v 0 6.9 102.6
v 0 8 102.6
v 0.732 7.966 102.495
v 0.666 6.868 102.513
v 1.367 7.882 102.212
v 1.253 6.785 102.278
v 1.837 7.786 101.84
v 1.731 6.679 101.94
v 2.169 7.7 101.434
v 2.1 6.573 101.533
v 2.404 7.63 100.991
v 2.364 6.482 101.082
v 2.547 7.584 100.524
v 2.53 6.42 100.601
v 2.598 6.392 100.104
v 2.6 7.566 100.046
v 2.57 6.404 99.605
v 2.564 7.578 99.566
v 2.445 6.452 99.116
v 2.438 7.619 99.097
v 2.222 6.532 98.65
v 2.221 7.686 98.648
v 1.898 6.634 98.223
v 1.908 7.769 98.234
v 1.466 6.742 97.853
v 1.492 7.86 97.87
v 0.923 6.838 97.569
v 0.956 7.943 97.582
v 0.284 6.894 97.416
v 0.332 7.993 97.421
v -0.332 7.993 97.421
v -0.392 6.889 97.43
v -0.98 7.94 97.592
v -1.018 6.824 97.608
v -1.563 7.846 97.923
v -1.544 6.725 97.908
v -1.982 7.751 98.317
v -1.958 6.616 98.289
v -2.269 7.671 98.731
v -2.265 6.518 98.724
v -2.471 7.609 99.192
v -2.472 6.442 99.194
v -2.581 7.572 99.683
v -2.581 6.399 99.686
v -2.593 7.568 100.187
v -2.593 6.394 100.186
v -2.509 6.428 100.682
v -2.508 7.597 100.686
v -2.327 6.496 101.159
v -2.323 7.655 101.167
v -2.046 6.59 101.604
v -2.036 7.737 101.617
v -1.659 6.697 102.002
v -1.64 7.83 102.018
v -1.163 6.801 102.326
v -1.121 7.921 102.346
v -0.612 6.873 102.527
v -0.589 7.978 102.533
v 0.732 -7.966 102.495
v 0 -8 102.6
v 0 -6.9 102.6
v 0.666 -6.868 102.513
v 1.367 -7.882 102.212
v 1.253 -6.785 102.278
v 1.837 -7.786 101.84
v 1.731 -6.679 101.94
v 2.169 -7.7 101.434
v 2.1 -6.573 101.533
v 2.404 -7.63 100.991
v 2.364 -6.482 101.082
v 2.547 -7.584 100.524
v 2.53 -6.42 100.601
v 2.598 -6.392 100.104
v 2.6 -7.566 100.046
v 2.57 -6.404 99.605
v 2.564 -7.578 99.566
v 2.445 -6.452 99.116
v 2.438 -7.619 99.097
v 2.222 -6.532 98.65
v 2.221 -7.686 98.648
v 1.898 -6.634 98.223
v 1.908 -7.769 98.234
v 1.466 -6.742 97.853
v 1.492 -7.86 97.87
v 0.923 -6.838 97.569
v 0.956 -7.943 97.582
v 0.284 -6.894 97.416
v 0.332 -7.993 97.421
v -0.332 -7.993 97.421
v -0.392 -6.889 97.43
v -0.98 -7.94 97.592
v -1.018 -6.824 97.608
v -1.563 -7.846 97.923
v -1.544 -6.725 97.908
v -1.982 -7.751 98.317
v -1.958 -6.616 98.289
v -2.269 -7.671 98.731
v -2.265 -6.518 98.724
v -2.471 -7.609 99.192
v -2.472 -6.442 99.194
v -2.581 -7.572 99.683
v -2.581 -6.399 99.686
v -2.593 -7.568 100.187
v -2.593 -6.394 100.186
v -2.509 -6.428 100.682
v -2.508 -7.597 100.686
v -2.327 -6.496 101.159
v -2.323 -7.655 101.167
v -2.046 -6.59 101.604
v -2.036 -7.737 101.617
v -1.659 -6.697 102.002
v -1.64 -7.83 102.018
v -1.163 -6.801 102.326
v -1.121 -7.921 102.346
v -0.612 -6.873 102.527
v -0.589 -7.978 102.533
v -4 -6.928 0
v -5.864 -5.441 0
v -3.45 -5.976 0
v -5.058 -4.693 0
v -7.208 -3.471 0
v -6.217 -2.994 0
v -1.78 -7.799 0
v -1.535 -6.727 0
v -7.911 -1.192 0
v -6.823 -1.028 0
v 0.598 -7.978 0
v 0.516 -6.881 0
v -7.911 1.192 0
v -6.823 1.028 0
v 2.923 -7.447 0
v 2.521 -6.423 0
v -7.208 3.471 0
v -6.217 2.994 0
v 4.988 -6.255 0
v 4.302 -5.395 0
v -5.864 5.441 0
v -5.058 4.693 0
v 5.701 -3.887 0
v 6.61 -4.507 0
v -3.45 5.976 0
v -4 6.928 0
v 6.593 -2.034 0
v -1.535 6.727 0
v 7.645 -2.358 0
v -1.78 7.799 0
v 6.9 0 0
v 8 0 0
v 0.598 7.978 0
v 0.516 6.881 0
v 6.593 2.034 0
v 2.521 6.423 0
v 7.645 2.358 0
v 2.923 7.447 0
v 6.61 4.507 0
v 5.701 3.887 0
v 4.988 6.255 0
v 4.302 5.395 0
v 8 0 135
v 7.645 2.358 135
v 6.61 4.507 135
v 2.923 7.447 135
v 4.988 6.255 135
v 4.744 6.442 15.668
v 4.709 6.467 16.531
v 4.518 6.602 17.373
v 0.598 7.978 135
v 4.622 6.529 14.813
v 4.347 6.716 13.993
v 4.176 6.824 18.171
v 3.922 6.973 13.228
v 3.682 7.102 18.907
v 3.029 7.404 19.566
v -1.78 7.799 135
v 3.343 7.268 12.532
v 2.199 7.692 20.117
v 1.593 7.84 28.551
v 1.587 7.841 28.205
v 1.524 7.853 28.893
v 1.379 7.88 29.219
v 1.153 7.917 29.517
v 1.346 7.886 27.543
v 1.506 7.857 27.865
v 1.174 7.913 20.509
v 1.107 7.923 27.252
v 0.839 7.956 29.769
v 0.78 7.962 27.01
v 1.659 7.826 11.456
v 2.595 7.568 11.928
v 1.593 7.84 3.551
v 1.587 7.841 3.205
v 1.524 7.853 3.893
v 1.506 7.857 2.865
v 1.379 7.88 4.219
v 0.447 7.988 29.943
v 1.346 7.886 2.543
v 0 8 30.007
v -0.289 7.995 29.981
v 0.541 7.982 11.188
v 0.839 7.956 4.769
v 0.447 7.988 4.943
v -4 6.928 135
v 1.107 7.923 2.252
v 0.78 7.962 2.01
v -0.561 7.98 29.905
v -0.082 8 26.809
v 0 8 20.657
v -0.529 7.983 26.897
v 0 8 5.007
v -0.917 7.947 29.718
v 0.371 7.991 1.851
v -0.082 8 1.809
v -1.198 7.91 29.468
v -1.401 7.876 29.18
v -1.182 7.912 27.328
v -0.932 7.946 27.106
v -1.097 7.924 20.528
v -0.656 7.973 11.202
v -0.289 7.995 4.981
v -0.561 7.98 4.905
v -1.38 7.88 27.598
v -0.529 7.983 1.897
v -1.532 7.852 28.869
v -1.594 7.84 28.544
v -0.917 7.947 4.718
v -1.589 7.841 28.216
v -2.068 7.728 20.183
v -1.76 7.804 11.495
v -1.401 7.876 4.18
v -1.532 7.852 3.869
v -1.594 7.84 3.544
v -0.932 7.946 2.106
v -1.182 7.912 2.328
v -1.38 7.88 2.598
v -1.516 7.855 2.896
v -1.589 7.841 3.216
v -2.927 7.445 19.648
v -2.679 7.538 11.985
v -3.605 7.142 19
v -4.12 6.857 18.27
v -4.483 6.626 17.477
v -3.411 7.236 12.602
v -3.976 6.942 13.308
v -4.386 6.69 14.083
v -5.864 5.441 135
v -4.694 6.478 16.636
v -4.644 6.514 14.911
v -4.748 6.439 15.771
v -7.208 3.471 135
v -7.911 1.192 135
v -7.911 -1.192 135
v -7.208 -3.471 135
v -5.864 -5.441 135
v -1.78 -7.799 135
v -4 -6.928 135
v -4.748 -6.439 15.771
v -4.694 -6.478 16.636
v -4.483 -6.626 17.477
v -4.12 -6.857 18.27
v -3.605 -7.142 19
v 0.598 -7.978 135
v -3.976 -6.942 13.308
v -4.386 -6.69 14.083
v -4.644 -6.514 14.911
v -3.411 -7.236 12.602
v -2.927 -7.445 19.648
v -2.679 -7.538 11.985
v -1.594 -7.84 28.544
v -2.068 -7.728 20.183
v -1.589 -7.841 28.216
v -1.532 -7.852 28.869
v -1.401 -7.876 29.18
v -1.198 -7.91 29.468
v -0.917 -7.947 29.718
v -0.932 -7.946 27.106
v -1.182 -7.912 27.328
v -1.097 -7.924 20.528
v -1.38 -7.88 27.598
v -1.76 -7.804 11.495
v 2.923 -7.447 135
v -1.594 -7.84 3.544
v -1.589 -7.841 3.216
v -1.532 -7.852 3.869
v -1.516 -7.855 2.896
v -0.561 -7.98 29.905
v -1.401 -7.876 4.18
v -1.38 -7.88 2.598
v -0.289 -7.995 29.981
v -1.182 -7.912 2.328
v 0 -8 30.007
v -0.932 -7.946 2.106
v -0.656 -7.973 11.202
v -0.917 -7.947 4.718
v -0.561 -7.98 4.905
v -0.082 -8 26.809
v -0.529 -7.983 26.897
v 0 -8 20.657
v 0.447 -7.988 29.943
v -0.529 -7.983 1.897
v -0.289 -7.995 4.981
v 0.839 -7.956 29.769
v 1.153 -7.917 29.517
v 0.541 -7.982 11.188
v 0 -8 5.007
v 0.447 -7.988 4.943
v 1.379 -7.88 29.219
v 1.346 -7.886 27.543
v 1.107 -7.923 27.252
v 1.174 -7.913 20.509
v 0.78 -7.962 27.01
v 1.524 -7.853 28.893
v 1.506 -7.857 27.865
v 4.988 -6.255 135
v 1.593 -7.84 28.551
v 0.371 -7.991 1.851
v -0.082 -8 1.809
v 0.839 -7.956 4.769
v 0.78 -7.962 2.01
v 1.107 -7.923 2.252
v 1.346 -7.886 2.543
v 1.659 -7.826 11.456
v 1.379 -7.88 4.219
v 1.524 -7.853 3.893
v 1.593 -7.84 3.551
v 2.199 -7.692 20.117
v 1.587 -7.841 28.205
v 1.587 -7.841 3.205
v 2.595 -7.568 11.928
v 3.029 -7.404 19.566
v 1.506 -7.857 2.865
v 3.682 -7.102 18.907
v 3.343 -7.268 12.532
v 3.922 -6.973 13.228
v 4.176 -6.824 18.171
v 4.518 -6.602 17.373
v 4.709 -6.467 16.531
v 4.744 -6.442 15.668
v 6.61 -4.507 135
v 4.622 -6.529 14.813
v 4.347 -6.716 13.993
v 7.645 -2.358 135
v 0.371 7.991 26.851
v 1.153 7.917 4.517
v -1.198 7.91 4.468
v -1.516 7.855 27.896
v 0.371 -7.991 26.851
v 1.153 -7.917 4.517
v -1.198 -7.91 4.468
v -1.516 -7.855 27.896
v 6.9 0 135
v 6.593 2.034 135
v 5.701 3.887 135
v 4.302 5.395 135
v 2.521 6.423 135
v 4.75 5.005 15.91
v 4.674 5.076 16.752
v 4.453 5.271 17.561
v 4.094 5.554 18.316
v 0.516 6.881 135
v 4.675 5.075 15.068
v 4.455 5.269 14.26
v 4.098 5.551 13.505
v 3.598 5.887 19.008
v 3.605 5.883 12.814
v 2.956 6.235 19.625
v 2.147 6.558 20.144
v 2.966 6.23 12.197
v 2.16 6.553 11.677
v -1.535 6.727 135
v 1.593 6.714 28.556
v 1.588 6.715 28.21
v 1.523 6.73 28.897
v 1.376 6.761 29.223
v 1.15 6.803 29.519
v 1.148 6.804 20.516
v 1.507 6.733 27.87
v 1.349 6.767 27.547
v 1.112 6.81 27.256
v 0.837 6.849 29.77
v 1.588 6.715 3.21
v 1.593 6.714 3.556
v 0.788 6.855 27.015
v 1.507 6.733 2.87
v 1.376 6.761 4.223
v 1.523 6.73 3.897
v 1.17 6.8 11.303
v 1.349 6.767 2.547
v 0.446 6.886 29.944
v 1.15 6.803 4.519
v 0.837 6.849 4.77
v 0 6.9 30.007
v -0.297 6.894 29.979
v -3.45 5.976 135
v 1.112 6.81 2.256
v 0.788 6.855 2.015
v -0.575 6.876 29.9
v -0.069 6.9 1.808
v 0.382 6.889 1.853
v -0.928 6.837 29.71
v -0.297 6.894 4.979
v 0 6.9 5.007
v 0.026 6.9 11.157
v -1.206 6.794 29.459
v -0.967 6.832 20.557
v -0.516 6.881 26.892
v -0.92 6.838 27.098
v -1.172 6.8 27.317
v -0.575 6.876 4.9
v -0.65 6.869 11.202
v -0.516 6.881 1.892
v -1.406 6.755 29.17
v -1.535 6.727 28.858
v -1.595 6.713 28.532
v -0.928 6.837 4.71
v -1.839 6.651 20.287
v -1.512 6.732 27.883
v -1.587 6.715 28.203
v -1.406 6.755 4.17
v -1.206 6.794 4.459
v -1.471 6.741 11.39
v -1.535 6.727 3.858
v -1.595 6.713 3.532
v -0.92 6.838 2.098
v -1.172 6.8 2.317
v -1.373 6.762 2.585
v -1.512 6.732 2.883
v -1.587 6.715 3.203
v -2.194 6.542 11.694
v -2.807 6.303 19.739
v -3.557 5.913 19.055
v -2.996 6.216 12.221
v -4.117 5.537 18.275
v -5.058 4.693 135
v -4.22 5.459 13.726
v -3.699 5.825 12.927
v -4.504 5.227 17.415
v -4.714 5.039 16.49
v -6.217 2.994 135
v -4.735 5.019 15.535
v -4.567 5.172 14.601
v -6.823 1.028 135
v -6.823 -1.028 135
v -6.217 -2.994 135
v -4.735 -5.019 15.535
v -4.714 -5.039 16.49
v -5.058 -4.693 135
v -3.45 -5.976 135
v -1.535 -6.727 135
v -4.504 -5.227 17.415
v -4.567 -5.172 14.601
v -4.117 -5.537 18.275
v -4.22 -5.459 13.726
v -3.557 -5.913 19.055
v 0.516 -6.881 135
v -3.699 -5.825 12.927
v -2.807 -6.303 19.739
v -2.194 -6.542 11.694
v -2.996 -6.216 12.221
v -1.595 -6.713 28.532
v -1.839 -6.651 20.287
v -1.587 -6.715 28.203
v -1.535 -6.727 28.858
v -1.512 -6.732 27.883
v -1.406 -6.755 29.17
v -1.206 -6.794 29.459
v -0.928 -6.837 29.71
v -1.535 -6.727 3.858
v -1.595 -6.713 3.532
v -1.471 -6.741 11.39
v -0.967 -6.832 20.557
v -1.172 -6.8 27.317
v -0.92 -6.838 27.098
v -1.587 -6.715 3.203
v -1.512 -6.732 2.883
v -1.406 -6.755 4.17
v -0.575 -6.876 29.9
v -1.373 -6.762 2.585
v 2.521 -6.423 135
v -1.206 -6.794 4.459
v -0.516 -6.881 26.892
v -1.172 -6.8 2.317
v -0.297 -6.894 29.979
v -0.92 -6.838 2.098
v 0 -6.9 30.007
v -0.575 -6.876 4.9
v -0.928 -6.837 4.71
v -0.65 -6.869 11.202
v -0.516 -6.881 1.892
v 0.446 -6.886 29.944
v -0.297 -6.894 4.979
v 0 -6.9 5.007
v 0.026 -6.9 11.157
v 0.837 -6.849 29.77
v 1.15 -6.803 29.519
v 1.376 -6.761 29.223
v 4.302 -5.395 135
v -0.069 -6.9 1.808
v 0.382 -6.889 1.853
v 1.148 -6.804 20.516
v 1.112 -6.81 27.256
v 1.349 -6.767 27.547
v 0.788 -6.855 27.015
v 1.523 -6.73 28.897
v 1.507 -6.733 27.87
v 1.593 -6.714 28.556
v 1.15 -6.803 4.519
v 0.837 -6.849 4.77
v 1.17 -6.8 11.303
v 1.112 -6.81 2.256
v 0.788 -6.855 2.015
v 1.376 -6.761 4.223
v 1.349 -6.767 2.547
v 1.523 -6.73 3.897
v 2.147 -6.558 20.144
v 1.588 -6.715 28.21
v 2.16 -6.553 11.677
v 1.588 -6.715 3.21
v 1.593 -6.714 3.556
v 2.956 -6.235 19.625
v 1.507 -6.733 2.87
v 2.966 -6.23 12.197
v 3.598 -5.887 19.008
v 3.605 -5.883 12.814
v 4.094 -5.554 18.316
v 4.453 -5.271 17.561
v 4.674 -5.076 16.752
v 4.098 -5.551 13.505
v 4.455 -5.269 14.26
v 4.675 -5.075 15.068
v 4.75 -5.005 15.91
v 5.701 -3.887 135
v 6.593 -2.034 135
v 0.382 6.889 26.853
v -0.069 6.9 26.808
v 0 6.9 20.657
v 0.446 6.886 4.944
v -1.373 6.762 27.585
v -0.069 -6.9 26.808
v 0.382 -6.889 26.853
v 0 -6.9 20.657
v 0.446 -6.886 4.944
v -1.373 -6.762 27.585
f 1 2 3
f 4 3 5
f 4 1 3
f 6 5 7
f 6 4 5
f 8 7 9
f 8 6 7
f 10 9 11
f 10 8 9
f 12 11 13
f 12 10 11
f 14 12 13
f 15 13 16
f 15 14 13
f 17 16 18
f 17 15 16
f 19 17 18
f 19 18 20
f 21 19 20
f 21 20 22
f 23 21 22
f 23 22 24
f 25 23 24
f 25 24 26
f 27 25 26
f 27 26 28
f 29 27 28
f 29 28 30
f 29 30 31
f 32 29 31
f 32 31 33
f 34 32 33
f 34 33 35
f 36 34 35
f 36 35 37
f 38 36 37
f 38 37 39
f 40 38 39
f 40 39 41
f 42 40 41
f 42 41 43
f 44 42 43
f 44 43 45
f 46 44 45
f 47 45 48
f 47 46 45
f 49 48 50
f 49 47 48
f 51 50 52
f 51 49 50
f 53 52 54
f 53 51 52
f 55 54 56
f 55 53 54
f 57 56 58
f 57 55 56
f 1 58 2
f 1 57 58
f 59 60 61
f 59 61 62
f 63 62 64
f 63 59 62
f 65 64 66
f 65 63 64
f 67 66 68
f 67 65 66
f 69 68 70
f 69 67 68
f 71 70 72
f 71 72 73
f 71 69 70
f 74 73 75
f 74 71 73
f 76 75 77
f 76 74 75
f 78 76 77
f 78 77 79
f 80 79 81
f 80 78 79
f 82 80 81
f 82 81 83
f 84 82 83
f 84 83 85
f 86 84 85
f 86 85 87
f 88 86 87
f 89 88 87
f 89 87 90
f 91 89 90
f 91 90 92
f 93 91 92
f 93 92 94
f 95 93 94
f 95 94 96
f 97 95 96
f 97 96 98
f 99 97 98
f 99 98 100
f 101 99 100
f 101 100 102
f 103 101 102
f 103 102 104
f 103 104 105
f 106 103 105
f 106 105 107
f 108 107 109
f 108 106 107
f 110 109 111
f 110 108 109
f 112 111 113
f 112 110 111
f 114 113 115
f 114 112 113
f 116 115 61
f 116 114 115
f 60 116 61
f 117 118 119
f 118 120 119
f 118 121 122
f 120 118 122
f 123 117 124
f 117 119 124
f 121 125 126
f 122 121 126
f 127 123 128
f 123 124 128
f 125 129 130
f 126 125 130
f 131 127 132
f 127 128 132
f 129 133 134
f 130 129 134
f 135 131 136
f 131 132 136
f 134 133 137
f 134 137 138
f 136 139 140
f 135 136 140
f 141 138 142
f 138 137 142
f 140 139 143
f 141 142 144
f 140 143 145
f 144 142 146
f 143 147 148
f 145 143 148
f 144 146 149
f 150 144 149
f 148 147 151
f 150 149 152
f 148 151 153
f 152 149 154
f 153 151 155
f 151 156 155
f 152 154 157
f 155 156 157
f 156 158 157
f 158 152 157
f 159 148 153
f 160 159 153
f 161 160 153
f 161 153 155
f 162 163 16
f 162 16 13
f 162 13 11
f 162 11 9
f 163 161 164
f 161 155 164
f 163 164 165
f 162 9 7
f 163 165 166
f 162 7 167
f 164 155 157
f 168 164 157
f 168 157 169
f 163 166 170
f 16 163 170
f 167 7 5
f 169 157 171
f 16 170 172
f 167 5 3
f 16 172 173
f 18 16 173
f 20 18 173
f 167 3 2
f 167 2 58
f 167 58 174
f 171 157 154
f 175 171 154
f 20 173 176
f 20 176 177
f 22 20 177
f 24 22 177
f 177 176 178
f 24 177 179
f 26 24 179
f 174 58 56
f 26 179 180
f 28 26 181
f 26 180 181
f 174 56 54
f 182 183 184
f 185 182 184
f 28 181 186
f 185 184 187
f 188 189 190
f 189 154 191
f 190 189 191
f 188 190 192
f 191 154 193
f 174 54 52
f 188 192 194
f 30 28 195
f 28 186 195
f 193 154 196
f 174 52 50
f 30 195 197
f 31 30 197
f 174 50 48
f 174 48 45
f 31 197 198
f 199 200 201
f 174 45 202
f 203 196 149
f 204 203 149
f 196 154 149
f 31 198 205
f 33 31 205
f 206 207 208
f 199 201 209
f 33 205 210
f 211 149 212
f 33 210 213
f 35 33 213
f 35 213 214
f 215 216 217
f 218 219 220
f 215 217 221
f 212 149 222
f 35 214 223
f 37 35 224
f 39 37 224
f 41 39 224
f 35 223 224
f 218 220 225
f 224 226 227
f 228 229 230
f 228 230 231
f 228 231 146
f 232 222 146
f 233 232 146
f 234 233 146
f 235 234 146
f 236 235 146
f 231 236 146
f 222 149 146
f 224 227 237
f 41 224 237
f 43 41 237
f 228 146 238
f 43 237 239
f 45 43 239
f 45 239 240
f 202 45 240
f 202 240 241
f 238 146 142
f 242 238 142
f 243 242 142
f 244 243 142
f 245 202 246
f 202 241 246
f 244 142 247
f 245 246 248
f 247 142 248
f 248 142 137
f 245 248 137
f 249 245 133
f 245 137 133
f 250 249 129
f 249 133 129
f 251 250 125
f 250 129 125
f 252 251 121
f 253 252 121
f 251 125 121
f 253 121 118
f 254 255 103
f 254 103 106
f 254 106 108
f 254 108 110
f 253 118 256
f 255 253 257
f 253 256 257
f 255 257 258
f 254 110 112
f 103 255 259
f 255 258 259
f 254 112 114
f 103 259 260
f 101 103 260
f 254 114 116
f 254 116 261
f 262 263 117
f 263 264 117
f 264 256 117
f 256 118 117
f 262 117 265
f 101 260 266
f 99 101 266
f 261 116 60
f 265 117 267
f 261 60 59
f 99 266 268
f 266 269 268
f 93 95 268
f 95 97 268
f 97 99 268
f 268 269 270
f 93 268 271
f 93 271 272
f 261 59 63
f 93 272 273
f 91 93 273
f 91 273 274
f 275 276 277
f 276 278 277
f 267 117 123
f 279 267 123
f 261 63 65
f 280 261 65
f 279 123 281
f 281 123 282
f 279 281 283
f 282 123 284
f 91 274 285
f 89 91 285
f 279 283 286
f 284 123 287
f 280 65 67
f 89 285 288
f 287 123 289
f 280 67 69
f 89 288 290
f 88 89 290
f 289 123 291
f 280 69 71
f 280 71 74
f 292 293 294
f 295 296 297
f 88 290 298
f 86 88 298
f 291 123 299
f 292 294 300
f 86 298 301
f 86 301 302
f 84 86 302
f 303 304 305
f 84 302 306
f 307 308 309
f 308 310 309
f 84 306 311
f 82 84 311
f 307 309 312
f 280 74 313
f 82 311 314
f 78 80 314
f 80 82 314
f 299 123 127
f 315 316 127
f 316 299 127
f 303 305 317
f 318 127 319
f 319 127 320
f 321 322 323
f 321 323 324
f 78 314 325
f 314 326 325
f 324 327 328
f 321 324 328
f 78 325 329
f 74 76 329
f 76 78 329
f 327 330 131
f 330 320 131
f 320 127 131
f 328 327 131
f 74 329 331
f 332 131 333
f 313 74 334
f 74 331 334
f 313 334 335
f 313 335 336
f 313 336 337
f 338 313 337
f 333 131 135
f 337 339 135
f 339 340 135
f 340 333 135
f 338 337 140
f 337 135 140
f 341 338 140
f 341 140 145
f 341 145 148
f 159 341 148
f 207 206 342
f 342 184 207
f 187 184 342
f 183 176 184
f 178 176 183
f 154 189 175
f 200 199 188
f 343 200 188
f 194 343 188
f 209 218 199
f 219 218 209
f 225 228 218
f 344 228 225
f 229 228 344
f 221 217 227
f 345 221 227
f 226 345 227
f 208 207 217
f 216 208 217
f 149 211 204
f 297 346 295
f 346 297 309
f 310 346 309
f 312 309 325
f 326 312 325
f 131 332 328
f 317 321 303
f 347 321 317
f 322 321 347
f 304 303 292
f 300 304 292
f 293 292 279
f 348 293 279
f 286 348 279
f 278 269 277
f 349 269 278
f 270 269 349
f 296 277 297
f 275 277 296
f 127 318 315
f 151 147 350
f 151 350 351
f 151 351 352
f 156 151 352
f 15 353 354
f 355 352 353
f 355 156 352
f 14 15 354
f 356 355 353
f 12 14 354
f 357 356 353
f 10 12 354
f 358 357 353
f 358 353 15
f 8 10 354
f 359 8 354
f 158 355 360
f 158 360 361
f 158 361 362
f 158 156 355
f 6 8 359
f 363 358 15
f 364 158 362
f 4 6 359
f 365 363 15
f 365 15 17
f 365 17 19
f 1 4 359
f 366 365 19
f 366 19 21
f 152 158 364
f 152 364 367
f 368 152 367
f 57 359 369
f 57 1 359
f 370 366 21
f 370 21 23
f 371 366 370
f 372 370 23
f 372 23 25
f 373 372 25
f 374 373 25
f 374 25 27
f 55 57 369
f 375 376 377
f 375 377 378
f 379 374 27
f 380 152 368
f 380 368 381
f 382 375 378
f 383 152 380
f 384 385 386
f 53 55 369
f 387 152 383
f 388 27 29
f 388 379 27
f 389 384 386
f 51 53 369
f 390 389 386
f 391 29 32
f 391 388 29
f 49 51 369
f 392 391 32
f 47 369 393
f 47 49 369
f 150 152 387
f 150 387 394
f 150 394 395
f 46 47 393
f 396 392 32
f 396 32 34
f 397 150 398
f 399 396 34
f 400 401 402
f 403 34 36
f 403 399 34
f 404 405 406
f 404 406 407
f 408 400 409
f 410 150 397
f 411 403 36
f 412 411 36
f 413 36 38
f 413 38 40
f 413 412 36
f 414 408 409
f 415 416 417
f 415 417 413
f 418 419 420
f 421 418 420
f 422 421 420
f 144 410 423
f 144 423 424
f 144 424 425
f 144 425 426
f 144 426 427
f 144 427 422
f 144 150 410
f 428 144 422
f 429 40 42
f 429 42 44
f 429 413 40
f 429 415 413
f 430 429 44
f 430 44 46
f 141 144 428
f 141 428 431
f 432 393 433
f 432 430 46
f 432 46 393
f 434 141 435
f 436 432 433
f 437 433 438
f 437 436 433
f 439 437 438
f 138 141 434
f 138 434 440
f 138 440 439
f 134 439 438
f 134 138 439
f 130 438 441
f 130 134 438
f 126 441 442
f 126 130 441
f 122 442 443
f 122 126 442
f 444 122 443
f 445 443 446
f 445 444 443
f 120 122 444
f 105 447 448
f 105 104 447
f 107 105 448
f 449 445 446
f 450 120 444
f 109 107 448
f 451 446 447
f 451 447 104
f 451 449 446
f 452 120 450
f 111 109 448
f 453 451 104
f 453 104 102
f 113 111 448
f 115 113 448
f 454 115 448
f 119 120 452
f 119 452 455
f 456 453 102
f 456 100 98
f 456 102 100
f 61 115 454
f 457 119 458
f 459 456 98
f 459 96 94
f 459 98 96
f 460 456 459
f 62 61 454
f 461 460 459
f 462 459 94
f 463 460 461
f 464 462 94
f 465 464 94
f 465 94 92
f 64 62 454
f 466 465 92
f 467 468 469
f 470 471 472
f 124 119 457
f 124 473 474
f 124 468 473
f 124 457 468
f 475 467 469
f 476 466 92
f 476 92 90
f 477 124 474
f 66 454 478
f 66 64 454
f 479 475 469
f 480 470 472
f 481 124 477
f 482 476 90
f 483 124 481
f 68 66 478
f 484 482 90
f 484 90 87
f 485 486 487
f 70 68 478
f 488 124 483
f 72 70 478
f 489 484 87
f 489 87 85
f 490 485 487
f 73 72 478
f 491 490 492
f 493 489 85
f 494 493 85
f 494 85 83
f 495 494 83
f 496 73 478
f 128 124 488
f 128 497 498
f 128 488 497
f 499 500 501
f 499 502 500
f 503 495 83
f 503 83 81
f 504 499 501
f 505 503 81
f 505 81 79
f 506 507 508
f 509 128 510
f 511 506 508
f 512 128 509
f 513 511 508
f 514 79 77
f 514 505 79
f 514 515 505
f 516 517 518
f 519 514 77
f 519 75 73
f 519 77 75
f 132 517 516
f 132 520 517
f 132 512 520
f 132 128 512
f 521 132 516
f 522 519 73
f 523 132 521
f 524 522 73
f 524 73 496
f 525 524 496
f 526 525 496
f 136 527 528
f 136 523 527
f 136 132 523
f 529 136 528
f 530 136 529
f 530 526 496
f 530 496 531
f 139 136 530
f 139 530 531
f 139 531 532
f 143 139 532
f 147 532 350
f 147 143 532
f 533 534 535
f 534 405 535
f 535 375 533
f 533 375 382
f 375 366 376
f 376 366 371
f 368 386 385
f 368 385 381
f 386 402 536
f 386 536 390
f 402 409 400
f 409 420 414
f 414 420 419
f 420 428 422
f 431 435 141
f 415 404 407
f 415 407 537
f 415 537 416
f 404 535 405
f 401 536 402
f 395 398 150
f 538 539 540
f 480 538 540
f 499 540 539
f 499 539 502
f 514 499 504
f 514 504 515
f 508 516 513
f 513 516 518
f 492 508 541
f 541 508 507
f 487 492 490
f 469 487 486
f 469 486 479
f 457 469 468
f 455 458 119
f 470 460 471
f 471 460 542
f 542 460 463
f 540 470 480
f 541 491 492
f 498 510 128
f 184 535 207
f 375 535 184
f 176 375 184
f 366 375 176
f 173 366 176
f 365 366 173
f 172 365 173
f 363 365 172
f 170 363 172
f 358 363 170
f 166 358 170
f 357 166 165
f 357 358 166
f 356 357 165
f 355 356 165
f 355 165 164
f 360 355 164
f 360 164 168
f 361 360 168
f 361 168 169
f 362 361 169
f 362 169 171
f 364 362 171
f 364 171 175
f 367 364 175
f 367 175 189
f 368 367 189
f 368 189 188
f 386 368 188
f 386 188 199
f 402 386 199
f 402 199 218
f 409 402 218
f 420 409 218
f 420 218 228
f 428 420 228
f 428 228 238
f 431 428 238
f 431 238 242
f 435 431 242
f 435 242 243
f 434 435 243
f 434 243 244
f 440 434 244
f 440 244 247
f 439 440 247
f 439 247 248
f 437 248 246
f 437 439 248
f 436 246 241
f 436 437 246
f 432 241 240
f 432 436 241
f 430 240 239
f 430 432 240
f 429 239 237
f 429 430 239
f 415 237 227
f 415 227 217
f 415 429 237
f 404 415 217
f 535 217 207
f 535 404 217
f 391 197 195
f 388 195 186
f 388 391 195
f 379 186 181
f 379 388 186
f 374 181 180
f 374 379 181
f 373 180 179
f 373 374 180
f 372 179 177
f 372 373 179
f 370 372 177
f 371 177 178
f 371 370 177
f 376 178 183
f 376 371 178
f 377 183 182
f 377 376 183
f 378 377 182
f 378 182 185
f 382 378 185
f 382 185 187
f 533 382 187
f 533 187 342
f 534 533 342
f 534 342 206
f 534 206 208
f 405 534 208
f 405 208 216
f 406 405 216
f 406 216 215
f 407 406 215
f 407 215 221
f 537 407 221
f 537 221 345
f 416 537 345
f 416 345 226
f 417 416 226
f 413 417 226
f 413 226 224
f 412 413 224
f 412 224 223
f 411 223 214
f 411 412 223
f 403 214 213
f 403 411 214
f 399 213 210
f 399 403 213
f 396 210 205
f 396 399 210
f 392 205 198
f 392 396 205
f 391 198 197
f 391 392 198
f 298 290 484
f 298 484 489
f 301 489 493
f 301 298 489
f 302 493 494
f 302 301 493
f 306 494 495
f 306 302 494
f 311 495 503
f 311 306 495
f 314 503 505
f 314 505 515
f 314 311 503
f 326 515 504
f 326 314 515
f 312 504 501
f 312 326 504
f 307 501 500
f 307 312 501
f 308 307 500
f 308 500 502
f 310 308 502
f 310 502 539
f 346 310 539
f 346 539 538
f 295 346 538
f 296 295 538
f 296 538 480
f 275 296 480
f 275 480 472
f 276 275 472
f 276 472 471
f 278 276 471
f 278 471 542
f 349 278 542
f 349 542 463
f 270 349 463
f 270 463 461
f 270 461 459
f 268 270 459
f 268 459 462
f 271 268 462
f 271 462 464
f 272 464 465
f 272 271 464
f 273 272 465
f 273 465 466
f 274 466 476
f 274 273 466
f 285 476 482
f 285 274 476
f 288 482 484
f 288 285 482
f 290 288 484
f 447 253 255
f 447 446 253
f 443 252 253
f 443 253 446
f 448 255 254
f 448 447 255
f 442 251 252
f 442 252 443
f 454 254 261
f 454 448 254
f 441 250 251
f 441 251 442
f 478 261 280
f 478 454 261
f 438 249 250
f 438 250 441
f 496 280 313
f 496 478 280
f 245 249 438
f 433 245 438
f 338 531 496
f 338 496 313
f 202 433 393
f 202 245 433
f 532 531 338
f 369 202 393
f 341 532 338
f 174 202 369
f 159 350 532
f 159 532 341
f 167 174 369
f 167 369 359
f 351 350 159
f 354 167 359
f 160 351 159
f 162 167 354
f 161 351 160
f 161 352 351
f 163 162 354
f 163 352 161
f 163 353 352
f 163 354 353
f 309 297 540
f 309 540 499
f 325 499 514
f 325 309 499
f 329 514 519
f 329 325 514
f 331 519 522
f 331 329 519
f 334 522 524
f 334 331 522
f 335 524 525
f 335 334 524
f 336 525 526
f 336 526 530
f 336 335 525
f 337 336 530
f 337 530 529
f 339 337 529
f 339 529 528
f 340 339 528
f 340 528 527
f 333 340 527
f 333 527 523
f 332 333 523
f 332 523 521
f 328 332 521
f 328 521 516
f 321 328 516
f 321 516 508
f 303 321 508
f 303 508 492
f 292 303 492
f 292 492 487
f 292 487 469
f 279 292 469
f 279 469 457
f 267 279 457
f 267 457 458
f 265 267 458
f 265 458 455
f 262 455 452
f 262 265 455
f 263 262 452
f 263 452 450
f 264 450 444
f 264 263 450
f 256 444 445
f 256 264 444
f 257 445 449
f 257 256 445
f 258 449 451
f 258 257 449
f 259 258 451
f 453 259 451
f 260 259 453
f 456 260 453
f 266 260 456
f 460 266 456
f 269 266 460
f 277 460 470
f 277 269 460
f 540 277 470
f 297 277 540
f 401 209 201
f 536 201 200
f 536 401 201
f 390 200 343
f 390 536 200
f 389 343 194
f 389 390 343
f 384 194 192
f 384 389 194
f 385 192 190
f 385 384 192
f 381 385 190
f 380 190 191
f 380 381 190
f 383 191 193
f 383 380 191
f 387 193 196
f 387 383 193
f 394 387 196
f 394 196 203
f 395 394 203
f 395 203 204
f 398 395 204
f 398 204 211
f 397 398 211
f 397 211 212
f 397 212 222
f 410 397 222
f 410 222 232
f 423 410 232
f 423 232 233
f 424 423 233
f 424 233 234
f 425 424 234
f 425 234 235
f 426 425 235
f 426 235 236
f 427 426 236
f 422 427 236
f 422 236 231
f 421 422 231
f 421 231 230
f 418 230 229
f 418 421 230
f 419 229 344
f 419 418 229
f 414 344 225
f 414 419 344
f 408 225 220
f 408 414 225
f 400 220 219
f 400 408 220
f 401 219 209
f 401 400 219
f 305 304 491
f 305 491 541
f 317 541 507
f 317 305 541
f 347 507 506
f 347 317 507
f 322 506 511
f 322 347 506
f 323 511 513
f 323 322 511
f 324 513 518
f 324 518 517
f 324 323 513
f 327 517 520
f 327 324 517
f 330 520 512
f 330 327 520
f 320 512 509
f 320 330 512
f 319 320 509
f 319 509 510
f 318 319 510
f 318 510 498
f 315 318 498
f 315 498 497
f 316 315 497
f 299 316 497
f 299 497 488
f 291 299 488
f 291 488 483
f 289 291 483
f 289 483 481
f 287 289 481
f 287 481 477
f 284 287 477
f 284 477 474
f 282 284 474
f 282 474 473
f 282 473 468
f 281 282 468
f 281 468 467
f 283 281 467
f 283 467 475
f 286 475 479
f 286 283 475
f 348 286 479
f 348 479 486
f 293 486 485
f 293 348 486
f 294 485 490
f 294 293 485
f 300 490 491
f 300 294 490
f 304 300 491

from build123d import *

# Parameters (mm, degrees)
SKETCH1_R               = 8
SKETCH1_R_2             = 6.9
BOSS_EXTRUDE1_DEPTH     = 135
CUT_EXTRUDE1_DEPTH      = 136.473244591
CUT_EXTRUDE1_DEPTH_BACK = 136.473244591
SKETCH3_R               = 2.6
SKETCH3_R_2             = 4.75
SKETCH3_R_3             = 1.6


with BuildPart() as part:
    # Sketch1 → Boss-Extrude1 (new body)
    with BuildSketch(Plane.XY):
        Circle(SKETCH1_R)
        Circle(SKETCH1_R_2, mode=Mode.SUBTRACT)
    extrude(amount=BOSS_EXTRUDE1_DEPTH)

    # Sketch3 → Cut-Extrude1 (cut, two sides: drawn at the far end of the back side and taken through both)
    with BuildSketch(Plane(origin=(0, 0, 0), x_dir=(1, 0, 0), z_dir=(0, 1, 0)).offset(-CUT_EXTRUDE1_DEPTH_BACK)):
        with Locations((0, -100)):
            Circle(SKETCH3_R)
        with Locations((0, -15.906910881)):
            Circle(SKETCH3_R_2)
        with Locations((0, -3.406910881)):
            Circle(SKETCH3_R_3)
        with Locations((0, -28.406910881)):
            Circle(SKETCH3_R_3)
    extrude(amount=CUT_EXTRUDE1_DEPTH + CUT_EXTRUDE1_DEPTH_BACK, mode=Mode.SUBTRACT)


solid = part.part
